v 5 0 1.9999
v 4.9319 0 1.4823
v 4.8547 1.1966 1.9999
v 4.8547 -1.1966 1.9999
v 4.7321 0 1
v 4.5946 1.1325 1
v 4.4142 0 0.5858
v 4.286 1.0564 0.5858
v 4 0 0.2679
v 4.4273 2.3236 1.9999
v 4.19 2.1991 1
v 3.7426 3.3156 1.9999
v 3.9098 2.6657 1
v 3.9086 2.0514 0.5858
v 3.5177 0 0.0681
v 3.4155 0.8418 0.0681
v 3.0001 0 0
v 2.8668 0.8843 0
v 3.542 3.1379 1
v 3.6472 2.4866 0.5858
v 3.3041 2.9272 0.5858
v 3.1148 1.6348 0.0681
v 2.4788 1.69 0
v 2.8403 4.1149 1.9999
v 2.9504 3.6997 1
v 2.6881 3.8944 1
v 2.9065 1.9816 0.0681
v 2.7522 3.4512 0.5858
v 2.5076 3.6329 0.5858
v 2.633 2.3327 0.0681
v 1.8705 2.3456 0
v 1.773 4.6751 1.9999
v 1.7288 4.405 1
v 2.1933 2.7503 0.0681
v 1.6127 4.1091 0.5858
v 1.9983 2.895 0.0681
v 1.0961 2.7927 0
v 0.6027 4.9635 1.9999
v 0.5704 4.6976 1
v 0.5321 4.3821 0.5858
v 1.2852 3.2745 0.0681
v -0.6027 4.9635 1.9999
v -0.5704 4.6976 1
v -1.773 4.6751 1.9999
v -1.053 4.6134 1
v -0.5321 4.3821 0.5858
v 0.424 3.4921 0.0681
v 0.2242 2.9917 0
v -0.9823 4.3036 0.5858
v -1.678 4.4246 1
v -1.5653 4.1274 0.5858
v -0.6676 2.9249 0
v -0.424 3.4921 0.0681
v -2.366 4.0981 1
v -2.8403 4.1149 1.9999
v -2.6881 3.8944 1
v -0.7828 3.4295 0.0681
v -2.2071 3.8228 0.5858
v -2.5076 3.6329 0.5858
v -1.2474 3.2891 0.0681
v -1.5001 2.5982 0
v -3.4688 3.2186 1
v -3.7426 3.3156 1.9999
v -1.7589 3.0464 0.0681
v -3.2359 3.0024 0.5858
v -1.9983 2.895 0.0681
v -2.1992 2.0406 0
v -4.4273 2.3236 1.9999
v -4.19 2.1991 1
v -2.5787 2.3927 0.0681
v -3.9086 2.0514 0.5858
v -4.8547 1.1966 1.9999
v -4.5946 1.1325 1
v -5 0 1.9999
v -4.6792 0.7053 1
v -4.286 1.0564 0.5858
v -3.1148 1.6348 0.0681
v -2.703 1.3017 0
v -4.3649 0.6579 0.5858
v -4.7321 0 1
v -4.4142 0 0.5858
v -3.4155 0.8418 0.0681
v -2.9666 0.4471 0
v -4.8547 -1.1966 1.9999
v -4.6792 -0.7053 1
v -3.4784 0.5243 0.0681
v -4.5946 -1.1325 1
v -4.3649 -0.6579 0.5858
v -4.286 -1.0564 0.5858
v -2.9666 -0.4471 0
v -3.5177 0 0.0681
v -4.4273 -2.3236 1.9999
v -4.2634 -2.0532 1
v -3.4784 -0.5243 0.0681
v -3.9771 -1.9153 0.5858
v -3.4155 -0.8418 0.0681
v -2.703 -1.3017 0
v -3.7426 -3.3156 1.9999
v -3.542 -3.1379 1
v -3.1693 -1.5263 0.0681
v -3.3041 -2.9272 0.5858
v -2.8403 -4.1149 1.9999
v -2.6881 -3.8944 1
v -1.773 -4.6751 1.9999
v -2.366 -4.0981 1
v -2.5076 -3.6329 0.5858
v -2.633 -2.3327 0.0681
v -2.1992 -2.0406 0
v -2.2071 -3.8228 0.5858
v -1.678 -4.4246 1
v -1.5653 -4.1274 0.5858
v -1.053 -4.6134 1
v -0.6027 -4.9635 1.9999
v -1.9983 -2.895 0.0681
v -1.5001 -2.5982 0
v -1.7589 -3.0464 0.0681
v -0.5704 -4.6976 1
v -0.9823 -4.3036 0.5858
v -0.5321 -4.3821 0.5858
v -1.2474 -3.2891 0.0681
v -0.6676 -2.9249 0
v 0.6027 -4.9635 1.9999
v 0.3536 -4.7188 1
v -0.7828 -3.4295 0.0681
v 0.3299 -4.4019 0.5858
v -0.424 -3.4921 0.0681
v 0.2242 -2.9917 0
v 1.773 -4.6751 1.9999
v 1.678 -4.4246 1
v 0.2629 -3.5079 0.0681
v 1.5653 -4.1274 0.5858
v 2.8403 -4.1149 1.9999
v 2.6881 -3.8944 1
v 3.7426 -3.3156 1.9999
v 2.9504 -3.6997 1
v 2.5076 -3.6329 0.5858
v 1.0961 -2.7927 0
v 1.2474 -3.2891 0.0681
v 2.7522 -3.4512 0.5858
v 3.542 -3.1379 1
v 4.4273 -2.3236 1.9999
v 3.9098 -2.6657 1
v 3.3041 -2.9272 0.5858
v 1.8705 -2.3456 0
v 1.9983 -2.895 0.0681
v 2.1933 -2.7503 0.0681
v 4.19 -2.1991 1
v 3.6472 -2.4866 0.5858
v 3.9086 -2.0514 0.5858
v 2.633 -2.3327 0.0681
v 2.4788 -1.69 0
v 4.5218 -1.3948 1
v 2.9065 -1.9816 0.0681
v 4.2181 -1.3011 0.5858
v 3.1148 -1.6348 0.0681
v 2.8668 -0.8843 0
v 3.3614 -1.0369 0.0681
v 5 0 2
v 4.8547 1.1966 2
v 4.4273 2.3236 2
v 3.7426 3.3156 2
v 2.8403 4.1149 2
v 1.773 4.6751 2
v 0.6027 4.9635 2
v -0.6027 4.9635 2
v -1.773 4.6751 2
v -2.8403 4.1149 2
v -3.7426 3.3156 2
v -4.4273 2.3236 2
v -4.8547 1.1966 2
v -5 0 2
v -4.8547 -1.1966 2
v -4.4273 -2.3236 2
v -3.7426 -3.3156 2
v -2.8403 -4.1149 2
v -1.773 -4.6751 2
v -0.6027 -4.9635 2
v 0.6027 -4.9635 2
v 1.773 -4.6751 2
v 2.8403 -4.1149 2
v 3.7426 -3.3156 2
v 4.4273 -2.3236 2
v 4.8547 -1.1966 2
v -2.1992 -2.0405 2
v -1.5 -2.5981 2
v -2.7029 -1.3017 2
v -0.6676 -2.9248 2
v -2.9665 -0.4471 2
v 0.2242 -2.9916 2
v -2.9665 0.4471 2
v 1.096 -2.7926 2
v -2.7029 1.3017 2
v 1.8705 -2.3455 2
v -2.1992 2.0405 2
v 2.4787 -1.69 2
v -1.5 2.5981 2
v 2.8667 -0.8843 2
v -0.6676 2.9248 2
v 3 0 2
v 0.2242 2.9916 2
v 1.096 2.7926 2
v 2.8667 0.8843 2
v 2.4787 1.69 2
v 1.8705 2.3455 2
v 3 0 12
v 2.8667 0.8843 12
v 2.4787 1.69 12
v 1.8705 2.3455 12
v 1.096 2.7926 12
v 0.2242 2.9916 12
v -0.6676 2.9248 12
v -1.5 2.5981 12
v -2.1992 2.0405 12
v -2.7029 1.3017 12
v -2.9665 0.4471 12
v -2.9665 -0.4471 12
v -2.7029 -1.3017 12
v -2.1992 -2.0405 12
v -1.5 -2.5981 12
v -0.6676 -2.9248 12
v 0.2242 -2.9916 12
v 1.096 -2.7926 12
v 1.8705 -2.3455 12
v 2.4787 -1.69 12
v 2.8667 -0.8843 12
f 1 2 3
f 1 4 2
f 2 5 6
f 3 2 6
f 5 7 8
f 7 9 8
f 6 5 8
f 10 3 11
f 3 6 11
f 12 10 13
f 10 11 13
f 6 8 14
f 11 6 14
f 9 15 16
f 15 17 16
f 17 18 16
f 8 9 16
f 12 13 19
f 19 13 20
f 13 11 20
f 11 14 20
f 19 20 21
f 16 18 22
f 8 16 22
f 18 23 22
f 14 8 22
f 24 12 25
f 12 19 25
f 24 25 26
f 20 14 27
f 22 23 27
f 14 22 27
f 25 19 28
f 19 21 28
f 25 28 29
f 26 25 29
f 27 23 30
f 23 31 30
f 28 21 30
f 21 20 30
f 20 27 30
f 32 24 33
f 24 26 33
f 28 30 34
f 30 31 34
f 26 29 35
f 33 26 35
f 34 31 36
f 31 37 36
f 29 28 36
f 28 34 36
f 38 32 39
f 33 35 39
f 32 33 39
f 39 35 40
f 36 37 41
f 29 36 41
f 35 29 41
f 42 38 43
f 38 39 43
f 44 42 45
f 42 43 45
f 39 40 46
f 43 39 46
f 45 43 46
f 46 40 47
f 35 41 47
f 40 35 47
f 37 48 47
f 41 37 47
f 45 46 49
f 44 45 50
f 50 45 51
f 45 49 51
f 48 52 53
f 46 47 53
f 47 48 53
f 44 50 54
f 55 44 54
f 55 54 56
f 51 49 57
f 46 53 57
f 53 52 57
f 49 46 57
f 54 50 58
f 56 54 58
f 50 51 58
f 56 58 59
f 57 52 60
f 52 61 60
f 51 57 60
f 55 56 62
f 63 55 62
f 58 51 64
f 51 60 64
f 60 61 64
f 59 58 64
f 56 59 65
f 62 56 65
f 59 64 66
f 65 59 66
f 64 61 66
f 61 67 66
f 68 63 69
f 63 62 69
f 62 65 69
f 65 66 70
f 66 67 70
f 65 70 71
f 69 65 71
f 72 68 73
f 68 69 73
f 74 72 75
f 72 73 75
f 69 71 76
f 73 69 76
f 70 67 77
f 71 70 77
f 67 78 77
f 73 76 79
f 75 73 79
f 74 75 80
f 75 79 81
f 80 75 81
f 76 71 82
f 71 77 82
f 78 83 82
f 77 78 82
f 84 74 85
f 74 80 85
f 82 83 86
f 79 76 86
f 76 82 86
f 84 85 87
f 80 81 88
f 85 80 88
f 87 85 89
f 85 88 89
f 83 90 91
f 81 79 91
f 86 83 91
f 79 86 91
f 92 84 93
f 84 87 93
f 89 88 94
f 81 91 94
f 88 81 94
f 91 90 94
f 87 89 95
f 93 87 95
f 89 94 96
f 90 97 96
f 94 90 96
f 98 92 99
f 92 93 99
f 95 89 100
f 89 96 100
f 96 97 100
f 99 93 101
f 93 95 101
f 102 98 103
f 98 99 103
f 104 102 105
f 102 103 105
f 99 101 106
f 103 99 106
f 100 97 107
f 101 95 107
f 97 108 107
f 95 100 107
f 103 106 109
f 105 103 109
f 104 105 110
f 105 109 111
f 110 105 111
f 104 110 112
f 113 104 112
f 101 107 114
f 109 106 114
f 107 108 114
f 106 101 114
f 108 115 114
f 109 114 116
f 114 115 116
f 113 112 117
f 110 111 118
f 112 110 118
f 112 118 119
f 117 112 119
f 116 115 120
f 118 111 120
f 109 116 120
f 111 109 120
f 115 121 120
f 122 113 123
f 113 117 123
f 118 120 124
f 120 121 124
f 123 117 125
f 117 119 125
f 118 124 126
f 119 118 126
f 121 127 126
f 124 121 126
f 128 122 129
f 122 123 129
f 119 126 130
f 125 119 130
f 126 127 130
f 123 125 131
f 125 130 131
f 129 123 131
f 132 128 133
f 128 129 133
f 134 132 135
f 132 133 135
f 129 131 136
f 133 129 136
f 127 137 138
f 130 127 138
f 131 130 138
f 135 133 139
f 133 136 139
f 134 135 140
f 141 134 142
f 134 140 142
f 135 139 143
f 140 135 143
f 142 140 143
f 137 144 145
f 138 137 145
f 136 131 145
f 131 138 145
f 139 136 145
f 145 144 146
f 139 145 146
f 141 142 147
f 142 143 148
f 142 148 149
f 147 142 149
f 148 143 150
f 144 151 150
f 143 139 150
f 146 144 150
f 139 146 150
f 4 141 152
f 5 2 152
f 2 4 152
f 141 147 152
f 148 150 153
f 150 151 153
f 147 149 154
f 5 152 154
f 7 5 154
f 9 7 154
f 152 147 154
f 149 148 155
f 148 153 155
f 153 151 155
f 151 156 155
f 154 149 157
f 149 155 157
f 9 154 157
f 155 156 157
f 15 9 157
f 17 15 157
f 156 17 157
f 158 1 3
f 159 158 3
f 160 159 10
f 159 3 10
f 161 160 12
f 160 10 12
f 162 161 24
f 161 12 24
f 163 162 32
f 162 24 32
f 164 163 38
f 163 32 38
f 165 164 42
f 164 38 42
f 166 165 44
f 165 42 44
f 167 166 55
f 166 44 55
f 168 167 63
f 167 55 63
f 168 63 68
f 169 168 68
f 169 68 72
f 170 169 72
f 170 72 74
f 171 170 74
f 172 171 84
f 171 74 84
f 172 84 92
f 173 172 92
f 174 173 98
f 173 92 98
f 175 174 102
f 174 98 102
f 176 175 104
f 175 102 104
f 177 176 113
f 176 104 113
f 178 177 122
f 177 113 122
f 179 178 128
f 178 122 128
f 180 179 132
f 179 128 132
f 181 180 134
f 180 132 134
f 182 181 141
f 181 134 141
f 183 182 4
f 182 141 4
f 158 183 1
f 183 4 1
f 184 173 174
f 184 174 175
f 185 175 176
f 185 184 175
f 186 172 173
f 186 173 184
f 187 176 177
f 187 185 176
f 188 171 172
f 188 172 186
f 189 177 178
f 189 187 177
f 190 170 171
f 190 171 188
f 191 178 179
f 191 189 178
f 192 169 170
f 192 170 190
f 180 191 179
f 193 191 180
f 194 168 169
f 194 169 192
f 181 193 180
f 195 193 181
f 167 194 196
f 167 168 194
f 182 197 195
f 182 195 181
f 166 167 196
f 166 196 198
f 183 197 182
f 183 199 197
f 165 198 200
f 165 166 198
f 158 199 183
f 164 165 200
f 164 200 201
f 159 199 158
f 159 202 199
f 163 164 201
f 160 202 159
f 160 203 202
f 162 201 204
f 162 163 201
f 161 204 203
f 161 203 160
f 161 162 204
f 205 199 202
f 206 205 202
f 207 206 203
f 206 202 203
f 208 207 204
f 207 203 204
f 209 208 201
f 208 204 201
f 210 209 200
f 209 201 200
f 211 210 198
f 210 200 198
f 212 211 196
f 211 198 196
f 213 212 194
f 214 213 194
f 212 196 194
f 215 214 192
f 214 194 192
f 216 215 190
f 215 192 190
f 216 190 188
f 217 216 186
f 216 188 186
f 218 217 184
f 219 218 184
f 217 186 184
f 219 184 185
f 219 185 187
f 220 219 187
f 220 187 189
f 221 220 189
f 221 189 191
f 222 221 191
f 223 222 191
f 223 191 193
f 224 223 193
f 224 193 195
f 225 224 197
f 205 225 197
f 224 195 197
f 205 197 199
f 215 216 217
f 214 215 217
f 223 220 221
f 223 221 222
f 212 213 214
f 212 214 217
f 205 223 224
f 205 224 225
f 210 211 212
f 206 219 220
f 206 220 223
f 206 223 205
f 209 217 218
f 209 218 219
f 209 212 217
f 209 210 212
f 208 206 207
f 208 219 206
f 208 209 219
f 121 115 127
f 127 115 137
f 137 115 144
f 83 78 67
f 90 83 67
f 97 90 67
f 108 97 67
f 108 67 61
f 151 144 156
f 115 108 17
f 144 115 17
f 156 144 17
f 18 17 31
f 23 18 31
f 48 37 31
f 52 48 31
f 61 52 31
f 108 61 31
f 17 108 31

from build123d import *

# Parameters (mm, degrees)
ESQUISSE1_R          = 5
BASE_EXTRUSION_DEPTH = 2
ESQUISSE2_R          = 3
BOSS_EXTRU_1_DEPTH   = 10
CONG_1_R             = 2


with BuildPart() as part:
    # Esquisse1 → Base-Extrusion (new body)
    with BuildSketch(Plane.XY):
        Circle(ESQUISSE1_R)
    extrude(amount=BASE_EXTRUSION_DEPTH)

    # Esquisse2 → Boss.-Extru.1 (add)
    with BuildSketch(Plane.XY.offset(2)):
        Circle(ESQUISSE2_R)
    extrude(amount=BOSS_EXTRU_1_DEPTH)

    # Congé1
    cong_1_edges = [part.edges().sort_by_distance(p)[0] for p in [
        (-5, 0, 0),
    ]]
    fillet(cong_1_edges, radius=CONG_1_R - 0.0001)  # a hair under: the kernel refuses the full size


solid = part.part
